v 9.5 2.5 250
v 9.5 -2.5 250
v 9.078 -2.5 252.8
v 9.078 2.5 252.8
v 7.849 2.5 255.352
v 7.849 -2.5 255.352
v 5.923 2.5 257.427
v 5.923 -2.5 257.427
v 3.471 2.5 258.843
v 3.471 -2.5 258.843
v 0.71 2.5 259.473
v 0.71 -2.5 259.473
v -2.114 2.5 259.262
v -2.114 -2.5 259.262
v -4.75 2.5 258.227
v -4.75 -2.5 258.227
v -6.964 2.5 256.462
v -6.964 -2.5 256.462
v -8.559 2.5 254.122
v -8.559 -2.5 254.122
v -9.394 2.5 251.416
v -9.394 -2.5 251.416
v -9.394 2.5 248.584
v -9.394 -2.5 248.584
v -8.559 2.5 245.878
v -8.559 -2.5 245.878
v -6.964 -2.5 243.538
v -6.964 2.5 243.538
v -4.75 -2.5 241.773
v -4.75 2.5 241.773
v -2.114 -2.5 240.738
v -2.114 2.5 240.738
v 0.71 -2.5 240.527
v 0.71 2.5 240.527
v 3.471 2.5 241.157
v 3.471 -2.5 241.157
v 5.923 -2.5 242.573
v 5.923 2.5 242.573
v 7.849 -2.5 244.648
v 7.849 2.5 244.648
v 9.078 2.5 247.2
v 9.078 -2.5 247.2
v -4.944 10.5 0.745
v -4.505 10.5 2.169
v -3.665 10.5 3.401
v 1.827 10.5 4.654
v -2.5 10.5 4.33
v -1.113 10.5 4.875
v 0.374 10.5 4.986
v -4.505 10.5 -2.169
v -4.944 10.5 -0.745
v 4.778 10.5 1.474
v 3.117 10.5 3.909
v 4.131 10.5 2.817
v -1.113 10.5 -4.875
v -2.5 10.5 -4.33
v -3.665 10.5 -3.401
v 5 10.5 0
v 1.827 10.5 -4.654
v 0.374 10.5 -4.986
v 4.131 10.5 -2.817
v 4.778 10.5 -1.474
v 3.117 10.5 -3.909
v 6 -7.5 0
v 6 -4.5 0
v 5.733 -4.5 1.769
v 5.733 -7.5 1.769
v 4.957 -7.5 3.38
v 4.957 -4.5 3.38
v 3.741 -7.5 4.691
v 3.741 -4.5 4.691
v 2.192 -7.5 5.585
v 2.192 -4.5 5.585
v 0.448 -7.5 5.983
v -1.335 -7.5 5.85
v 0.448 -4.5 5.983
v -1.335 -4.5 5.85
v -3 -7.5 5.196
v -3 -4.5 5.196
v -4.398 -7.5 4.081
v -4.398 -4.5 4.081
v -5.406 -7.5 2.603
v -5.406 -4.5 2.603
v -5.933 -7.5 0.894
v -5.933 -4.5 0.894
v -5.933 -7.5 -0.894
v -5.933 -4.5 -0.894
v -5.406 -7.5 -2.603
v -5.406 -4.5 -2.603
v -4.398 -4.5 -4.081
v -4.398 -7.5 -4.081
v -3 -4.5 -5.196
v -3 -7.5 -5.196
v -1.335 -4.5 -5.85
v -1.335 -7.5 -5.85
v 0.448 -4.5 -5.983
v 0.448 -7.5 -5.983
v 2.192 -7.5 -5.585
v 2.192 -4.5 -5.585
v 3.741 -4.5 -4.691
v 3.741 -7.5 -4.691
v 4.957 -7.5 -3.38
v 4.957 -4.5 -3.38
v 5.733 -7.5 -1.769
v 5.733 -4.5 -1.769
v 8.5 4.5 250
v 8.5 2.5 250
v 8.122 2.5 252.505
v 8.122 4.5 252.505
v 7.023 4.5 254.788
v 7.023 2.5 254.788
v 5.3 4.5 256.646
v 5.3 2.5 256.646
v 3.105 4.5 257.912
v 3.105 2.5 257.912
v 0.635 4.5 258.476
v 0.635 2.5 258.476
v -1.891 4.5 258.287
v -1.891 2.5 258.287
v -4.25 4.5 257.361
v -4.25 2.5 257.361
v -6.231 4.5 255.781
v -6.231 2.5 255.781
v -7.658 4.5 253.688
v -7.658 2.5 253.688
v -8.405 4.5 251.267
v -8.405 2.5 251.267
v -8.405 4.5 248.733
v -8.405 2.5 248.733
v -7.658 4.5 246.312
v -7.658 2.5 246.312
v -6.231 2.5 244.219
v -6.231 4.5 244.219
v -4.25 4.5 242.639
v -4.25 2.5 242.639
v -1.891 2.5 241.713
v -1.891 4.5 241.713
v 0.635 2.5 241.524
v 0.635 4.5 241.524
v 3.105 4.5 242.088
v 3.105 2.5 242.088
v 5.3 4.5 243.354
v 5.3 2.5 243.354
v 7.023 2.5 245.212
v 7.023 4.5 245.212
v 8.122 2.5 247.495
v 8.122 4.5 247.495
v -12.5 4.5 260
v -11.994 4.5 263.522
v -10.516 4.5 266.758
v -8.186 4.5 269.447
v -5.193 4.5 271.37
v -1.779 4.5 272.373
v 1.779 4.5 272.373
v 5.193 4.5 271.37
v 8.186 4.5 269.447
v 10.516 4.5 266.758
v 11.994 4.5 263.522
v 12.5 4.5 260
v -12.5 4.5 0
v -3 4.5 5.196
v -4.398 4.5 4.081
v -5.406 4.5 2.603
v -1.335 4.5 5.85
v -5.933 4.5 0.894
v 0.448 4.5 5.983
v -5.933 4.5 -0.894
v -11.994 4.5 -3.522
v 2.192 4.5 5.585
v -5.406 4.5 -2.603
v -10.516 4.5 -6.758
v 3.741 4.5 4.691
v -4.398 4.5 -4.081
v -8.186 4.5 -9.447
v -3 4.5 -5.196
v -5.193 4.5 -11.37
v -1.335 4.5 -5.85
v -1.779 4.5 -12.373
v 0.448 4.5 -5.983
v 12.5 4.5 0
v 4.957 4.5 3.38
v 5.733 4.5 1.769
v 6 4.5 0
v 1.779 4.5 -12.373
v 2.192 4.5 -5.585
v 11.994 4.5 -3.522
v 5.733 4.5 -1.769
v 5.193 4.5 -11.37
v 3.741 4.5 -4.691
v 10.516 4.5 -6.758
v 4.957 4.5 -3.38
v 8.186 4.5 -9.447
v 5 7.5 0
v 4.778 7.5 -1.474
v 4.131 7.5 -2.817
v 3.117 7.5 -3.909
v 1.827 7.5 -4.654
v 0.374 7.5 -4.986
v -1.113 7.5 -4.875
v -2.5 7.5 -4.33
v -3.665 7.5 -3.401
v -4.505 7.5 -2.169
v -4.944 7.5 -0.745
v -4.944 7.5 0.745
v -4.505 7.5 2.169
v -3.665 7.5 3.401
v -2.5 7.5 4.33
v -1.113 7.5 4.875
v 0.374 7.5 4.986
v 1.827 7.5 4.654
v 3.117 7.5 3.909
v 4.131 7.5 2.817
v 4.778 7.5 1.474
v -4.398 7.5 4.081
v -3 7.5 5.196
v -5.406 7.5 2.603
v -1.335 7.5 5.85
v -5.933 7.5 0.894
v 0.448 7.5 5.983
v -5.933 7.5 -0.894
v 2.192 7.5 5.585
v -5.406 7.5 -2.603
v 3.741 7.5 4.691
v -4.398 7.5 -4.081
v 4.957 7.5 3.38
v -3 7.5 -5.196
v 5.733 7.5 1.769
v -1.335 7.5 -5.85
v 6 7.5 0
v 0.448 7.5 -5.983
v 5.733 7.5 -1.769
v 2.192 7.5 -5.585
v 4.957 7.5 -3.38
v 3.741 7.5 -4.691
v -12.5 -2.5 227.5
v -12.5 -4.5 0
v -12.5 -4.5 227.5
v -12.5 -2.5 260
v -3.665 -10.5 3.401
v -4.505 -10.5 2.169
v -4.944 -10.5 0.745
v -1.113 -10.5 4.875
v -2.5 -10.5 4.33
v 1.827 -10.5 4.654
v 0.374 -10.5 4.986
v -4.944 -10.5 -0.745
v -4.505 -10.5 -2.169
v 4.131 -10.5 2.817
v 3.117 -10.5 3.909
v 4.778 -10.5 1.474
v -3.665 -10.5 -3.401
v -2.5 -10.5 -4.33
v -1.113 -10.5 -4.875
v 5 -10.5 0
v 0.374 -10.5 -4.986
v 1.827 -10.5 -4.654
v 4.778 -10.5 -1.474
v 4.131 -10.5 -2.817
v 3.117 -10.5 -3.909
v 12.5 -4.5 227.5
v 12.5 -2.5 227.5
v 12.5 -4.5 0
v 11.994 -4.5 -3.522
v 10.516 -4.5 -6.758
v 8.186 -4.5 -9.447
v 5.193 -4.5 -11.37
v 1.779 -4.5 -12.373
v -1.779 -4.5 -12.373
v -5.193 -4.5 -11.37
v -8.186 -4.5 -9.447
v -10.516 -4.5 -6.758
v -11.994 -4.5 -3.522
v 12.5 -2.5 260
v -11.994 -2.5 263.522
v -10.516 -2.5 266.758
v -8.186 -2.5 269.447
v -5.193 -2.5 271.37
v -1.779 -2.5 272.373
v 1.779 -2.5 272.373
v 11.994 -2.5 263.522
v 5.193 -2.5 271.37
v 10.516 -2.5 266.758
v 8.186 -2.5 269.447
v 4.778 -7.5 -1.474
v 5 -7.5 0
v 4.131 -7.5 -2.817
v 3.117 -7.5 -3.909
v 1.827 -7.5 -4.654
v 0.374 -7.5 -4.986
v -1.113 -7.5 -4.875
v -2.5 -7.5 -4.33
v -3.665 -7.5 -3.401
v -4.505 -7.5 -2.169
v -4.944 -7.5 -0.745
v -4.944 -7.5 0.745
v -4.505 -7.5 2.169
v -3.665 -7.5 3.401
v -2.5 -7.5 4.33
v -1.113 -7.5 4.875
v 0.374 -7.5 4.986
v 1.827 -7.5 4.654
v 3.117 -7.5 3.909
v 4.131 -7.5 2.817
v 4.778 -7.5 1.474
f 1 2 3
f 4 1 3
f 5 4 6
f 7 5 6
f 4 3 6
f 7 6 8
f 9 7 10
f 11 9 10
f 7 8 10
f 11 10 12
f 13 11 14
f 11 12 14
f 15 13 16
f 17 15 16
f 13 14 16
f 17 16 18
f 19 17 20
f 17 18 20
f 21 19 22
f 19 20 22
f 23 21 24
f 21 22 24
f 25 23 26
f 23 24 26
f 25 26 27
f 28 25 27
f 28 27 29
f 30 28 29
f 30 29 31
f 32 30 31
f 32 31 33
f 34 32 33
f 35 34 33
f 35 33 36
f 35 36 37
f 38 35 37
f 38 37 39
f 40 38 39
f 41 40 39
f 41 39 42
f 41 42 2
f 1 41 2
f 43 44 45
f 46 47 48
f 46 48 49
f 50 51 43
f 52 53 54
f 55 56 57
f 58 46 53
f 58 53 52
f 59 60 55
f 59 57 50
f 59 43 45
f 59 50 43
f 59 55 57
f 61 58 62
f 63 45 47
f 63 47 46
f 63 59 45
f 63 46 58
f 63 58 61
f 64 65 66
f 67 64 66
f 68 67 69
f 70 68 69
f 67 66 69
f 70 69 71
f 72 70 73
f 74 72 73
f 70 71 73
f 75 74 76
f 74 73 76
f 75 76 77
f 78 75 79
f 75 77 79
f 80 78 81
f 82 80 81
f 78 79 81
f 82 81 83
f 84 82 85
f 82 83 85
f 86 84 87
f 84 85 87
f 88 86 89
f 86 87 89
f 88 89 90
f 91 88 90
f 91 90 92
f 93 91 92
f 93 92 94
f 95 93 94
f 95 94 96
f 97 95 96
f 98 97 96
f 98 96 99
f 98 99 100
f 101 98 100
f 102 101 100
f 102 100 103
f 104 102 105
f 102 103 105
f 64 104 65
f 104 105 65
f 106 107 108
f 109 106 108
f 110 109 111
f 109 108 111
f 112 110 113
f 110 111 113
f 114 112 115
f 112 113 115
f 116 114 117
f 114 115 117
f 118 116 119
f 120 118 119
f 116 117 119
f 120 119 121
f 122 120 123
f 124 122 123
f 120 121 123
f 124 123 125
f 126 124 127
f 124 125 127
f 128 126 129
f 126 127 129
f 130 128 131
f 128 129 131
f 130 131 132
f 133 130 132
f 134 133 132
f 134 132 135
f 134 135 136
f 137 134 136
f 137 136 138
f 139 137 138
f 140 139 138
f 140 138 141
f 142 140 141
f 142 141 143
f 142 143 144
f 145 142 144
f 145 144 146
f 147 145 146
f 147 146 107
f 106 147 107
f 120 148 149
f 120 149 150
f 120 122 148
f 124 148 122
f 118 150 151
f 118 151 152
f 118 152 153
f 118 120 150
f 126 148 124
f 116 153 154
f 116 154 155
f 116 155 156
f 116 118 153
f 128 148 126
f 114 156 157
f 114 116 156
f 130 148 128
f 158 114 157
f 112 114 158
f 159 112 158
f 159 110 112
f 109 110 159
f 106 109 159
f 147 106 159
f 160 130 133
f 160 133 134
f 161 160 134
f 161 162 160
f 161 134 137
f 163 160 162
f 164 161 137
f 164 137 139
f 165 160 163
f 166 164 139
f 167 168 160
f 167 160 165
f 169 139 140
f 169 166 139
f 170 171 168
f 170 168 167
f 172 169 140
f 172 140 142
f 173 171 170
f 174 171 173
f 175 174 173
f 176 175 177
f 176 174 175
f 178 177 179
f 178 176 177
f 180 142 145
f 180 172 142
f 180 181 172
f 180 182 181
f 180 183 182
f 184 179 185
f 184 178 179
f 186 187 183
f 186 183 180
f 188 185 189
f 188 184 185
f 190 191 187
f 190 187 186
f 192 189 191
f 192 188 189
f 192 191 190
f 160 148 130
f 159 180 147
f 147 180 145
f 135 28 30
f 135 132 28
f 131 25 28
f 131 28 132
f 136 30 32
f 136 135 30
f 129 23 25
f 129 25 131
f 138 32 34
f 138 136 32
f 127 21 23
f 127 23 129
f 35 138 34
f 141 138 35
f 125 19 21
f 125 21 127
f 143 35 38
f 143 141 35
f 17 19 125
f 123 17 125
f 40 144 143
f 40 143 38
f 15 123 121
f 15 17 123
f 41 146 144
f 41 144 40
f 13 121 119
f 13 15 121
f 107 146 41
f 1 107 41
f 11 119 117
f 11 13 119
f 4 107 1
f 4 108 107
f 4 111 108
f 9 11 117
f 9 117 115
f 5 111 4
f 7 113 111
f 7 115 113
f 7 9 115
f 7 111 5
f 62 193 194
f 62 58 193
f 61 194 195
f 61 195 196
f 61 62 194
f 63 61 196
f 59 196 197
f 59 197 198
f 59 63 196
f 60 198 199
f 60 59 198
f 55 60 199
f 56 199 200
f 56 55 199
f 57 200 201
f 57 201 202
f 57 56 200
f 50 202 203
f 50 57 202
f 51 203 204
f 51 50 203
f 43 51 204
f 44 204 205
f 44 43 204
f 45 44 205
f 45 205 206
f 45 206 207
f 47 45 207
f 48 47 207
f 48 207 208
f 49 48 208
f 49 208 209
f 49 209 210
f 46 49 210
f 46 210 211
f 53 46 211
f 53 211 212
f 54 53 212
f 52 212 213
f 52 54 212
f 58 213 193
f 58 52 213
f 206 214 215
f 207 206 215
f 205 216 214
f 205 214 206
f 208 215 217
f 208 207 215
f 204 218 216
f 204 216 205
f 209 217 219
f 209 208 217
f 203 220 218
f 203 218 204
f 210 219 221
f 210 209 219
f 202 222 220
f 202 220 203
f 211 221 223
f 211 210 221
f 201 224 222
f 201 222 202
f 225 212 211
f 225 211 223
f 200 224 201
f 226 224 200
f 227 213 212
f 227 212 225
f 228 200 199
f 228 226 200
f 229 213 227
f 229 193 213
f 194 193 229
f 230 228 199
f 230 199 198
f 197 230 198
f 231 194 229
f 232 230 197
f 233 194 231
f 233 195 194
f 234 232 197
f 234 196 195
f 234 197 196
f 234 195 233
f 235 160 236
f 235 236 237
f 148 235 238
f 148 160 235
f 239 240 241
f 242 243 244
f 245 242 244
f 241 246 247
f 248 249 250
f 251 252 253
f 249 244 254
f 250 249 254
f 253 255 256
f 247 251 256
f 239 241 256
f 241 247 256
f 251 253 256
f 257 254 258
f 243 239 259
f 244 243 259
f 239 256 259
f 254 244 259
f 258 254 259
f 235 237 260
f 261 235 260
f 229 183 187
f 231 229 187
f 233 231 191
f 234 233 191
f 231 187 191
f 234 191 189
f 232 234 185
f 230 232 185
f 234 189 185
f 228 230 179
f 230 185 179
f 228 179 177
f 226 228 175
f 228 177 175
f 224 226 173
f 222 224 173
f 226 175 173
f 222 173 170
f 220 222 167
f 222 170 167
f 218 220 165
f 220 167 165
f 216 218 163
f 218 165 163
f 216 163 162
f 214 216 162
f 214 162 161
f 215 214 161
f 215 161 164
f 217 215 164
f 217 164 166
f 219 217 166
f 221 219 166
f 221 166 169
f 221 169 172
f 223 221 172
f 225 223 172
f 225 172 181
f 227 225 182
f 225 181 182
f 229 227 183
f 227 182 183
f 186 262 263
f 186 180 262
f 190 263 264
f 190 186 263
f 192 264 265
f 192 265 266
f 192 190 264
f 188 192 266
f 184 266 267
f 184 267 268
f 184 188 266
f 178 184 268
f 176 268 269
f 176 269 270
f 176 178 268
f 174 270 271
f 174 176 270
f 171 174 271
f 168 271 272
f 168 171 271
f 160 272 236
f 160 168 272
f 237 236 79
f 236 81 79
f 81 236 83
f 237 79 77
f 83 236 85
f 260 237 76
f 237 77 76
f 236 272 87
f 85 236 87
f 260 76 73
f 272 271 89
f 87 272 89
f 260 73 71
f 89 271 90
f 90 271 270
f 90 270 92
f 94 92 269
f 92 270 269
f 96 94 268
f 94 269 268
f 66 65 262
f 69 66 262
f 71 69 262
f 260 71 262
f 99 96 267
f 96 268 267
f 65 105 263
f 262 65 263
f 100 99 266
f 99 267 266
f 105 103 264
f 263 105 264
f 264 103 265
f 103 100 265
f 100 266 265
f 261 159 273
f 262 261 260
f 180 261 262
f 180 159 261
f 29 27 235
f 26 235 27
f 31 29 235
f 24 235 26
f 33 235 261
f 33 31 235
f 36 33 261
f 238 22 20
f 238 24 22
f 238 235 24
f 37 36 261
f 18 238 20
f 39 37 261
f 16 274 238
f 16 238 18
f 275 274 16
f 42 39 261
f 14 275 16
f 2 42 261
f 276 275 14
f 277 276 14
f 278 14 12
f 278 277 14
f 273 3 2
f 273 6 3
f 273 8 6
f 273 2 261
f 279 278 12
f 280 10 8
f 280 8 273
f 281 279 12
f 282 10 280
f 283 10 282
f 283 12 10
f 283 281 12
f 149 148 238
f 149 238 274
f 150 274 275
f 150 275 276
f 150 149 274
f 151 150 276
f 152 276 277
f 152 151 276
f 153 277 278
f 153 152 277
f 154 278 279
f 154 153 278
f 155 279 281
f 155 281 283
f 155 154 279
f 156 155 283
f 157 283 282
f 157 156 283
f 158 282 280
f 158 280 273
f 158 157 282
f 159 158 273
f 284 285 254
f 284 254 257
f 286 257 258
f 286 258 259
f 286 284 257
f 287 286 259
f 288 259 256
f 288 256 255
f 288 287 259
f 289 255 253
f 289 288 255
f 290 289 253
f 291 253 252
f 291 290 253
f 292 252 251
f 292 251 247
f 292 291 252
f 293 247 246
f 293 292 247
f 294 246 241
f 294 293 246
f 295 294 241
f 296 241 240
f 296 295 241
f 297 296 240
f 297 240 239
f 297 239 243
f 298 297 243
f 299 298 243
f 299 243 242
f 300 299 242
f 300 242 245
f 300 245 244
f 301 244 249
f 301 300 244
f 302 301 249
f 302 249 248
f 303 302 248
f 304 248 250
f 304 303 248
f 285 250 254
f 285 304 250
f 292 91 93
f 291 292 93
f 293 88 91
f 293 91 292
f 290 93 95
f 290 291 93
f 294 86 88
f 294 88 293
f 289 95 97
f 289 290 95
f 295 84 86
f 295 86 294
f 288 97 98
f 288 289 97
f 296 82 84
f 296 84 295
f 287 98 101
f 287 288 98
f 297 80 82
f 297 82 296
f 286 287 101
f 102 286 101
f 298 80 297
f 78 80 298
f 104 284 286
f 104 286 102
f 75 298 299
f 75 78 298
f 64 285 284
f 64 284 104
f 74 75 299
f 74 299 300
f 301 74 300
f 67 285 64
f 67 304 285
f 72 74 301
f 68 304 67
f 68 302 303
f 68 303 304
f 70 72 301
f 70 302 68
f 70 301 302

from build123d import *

# Parameters (mm, degrees)
EXTRUDE_1_DEPTH      = 10.5
EXTRUDE_1_DEPTH_BACK = 10.5
SKETCH_1_R           = 5
EXTRUDE_3_DEPTH      = 4.5
EXTRUDE_3_DEPTH_BACK = 4.5
SKETCH_7_R           = 6
EXTRUDE_4_DEPTH      = 3
EXTRUDE_START        = 3
SKETCH_8_R           = 6
EXTRUDE_5_DEPTH      = 3
SKETCH_9_R           = 9.5
CUT_EXTRUDE_1_DEPTH  = 7
SKETCH_10_R          = 8.5
CUT_EXTRUDE_2_DEPTH  = 274.096136919
SKETCH_13_W          = 25
SKETCH_13_H          = 45
CUT_EXTRUDE_3_DEPTH  = 2


with BuildPart() as part:
    # 스케치1 → 보스-돌출1 (new, two sides: drawn at the far end of the back side and taken through both)
    with BuildSketch(Plane(origin=(0, 0, 0), x_dir=(1, 0, 0), z_dir=(0, 1, 0)).offset(-EXTRUDE_1_DEPTH_BACK)):
        Circle(SKETCH_1_R)
    extrude(amount=EXTRUDE_1_DEPTH + EXTRUDE_1_DEPTH_BACK)

    # 스케치6 → 보스-돌출3 (add, two sides: drawn at the far end of the back side and taken through both)
    with BuildSketch(Plane(origin=(0, 0, 0), x_dir=(1, 0, 0), z_dir=(0, 1, 0)).offset(-EXTRUDE_3_DEPTH_BACK)):
        with BuildLine():
            Line((-12.5, 0), (-12.5, -260))
            ThreePointArc((-12.5, -260), (0, -272.5), (12.5, -260))
            Line((12.5, -260), (12.5, 0))
            ThreePointArc((12.5, 0), (0, 12.5), (-12.5, 0))
        make_face()
    extrude(amount=EXTRUDE_3_DEPTH + EXTRUDE_3_DEPTH_BACK)

    # 스케치7 → 보스-돌출4 (add)
    with BuildSketch(Plane.XZ.offset(4.5)):
        Circle(SKETCH_7_R)
    extrude(amount=EXTRUDE_4_DEPTH)

    # 스케치8 → 보스-돌출5 (add)
    with BuildSketch(Plane(origin=(0, 4.5, 0), x_dir=(1, 0, 0), z_dir=(0, 1, 0)).offset(EXTRUDE_START)):
        Circle(SKETCH_8_R)
    extrude(amount=-EXTRUDE_5_DEPTH)

    # 스케치9 → 컷-돌출1 (cut)
    with BuildSketch(Plane.XZ.offset(4.5)):
        with Locations((0, 250)):
            Circle(SKETCH_9_R)
    extrude(amount=-CUT_EXTRUDE_1_DEPTH, mode=Mode.SUBTRACT)

    # 스케치10 → 컷-돌출2 (cut, through all)
    with BuildSketch(Plane.XZ.offset(-2.5)):
        with Locations((0, 250)):
            Circle(SKETCH_10_R)
    extrude(amount=-CUT_EXTRUDE_2_DEPTH, mode=Mode.SUBTRACT)

    # 스케치13 → 컷-돌출3 (cut)
    with BuildSketch(Plane.XZ.offset(4.5)):
        with Locations((0, 250)):
            Rectangle(SKETCH_13_W, SKETCH_13_H)
    extrude(amount=-CUT_EXTRUDE_3_DEPTH, mode=Mode.SUBTRACT)


solid = part.part
